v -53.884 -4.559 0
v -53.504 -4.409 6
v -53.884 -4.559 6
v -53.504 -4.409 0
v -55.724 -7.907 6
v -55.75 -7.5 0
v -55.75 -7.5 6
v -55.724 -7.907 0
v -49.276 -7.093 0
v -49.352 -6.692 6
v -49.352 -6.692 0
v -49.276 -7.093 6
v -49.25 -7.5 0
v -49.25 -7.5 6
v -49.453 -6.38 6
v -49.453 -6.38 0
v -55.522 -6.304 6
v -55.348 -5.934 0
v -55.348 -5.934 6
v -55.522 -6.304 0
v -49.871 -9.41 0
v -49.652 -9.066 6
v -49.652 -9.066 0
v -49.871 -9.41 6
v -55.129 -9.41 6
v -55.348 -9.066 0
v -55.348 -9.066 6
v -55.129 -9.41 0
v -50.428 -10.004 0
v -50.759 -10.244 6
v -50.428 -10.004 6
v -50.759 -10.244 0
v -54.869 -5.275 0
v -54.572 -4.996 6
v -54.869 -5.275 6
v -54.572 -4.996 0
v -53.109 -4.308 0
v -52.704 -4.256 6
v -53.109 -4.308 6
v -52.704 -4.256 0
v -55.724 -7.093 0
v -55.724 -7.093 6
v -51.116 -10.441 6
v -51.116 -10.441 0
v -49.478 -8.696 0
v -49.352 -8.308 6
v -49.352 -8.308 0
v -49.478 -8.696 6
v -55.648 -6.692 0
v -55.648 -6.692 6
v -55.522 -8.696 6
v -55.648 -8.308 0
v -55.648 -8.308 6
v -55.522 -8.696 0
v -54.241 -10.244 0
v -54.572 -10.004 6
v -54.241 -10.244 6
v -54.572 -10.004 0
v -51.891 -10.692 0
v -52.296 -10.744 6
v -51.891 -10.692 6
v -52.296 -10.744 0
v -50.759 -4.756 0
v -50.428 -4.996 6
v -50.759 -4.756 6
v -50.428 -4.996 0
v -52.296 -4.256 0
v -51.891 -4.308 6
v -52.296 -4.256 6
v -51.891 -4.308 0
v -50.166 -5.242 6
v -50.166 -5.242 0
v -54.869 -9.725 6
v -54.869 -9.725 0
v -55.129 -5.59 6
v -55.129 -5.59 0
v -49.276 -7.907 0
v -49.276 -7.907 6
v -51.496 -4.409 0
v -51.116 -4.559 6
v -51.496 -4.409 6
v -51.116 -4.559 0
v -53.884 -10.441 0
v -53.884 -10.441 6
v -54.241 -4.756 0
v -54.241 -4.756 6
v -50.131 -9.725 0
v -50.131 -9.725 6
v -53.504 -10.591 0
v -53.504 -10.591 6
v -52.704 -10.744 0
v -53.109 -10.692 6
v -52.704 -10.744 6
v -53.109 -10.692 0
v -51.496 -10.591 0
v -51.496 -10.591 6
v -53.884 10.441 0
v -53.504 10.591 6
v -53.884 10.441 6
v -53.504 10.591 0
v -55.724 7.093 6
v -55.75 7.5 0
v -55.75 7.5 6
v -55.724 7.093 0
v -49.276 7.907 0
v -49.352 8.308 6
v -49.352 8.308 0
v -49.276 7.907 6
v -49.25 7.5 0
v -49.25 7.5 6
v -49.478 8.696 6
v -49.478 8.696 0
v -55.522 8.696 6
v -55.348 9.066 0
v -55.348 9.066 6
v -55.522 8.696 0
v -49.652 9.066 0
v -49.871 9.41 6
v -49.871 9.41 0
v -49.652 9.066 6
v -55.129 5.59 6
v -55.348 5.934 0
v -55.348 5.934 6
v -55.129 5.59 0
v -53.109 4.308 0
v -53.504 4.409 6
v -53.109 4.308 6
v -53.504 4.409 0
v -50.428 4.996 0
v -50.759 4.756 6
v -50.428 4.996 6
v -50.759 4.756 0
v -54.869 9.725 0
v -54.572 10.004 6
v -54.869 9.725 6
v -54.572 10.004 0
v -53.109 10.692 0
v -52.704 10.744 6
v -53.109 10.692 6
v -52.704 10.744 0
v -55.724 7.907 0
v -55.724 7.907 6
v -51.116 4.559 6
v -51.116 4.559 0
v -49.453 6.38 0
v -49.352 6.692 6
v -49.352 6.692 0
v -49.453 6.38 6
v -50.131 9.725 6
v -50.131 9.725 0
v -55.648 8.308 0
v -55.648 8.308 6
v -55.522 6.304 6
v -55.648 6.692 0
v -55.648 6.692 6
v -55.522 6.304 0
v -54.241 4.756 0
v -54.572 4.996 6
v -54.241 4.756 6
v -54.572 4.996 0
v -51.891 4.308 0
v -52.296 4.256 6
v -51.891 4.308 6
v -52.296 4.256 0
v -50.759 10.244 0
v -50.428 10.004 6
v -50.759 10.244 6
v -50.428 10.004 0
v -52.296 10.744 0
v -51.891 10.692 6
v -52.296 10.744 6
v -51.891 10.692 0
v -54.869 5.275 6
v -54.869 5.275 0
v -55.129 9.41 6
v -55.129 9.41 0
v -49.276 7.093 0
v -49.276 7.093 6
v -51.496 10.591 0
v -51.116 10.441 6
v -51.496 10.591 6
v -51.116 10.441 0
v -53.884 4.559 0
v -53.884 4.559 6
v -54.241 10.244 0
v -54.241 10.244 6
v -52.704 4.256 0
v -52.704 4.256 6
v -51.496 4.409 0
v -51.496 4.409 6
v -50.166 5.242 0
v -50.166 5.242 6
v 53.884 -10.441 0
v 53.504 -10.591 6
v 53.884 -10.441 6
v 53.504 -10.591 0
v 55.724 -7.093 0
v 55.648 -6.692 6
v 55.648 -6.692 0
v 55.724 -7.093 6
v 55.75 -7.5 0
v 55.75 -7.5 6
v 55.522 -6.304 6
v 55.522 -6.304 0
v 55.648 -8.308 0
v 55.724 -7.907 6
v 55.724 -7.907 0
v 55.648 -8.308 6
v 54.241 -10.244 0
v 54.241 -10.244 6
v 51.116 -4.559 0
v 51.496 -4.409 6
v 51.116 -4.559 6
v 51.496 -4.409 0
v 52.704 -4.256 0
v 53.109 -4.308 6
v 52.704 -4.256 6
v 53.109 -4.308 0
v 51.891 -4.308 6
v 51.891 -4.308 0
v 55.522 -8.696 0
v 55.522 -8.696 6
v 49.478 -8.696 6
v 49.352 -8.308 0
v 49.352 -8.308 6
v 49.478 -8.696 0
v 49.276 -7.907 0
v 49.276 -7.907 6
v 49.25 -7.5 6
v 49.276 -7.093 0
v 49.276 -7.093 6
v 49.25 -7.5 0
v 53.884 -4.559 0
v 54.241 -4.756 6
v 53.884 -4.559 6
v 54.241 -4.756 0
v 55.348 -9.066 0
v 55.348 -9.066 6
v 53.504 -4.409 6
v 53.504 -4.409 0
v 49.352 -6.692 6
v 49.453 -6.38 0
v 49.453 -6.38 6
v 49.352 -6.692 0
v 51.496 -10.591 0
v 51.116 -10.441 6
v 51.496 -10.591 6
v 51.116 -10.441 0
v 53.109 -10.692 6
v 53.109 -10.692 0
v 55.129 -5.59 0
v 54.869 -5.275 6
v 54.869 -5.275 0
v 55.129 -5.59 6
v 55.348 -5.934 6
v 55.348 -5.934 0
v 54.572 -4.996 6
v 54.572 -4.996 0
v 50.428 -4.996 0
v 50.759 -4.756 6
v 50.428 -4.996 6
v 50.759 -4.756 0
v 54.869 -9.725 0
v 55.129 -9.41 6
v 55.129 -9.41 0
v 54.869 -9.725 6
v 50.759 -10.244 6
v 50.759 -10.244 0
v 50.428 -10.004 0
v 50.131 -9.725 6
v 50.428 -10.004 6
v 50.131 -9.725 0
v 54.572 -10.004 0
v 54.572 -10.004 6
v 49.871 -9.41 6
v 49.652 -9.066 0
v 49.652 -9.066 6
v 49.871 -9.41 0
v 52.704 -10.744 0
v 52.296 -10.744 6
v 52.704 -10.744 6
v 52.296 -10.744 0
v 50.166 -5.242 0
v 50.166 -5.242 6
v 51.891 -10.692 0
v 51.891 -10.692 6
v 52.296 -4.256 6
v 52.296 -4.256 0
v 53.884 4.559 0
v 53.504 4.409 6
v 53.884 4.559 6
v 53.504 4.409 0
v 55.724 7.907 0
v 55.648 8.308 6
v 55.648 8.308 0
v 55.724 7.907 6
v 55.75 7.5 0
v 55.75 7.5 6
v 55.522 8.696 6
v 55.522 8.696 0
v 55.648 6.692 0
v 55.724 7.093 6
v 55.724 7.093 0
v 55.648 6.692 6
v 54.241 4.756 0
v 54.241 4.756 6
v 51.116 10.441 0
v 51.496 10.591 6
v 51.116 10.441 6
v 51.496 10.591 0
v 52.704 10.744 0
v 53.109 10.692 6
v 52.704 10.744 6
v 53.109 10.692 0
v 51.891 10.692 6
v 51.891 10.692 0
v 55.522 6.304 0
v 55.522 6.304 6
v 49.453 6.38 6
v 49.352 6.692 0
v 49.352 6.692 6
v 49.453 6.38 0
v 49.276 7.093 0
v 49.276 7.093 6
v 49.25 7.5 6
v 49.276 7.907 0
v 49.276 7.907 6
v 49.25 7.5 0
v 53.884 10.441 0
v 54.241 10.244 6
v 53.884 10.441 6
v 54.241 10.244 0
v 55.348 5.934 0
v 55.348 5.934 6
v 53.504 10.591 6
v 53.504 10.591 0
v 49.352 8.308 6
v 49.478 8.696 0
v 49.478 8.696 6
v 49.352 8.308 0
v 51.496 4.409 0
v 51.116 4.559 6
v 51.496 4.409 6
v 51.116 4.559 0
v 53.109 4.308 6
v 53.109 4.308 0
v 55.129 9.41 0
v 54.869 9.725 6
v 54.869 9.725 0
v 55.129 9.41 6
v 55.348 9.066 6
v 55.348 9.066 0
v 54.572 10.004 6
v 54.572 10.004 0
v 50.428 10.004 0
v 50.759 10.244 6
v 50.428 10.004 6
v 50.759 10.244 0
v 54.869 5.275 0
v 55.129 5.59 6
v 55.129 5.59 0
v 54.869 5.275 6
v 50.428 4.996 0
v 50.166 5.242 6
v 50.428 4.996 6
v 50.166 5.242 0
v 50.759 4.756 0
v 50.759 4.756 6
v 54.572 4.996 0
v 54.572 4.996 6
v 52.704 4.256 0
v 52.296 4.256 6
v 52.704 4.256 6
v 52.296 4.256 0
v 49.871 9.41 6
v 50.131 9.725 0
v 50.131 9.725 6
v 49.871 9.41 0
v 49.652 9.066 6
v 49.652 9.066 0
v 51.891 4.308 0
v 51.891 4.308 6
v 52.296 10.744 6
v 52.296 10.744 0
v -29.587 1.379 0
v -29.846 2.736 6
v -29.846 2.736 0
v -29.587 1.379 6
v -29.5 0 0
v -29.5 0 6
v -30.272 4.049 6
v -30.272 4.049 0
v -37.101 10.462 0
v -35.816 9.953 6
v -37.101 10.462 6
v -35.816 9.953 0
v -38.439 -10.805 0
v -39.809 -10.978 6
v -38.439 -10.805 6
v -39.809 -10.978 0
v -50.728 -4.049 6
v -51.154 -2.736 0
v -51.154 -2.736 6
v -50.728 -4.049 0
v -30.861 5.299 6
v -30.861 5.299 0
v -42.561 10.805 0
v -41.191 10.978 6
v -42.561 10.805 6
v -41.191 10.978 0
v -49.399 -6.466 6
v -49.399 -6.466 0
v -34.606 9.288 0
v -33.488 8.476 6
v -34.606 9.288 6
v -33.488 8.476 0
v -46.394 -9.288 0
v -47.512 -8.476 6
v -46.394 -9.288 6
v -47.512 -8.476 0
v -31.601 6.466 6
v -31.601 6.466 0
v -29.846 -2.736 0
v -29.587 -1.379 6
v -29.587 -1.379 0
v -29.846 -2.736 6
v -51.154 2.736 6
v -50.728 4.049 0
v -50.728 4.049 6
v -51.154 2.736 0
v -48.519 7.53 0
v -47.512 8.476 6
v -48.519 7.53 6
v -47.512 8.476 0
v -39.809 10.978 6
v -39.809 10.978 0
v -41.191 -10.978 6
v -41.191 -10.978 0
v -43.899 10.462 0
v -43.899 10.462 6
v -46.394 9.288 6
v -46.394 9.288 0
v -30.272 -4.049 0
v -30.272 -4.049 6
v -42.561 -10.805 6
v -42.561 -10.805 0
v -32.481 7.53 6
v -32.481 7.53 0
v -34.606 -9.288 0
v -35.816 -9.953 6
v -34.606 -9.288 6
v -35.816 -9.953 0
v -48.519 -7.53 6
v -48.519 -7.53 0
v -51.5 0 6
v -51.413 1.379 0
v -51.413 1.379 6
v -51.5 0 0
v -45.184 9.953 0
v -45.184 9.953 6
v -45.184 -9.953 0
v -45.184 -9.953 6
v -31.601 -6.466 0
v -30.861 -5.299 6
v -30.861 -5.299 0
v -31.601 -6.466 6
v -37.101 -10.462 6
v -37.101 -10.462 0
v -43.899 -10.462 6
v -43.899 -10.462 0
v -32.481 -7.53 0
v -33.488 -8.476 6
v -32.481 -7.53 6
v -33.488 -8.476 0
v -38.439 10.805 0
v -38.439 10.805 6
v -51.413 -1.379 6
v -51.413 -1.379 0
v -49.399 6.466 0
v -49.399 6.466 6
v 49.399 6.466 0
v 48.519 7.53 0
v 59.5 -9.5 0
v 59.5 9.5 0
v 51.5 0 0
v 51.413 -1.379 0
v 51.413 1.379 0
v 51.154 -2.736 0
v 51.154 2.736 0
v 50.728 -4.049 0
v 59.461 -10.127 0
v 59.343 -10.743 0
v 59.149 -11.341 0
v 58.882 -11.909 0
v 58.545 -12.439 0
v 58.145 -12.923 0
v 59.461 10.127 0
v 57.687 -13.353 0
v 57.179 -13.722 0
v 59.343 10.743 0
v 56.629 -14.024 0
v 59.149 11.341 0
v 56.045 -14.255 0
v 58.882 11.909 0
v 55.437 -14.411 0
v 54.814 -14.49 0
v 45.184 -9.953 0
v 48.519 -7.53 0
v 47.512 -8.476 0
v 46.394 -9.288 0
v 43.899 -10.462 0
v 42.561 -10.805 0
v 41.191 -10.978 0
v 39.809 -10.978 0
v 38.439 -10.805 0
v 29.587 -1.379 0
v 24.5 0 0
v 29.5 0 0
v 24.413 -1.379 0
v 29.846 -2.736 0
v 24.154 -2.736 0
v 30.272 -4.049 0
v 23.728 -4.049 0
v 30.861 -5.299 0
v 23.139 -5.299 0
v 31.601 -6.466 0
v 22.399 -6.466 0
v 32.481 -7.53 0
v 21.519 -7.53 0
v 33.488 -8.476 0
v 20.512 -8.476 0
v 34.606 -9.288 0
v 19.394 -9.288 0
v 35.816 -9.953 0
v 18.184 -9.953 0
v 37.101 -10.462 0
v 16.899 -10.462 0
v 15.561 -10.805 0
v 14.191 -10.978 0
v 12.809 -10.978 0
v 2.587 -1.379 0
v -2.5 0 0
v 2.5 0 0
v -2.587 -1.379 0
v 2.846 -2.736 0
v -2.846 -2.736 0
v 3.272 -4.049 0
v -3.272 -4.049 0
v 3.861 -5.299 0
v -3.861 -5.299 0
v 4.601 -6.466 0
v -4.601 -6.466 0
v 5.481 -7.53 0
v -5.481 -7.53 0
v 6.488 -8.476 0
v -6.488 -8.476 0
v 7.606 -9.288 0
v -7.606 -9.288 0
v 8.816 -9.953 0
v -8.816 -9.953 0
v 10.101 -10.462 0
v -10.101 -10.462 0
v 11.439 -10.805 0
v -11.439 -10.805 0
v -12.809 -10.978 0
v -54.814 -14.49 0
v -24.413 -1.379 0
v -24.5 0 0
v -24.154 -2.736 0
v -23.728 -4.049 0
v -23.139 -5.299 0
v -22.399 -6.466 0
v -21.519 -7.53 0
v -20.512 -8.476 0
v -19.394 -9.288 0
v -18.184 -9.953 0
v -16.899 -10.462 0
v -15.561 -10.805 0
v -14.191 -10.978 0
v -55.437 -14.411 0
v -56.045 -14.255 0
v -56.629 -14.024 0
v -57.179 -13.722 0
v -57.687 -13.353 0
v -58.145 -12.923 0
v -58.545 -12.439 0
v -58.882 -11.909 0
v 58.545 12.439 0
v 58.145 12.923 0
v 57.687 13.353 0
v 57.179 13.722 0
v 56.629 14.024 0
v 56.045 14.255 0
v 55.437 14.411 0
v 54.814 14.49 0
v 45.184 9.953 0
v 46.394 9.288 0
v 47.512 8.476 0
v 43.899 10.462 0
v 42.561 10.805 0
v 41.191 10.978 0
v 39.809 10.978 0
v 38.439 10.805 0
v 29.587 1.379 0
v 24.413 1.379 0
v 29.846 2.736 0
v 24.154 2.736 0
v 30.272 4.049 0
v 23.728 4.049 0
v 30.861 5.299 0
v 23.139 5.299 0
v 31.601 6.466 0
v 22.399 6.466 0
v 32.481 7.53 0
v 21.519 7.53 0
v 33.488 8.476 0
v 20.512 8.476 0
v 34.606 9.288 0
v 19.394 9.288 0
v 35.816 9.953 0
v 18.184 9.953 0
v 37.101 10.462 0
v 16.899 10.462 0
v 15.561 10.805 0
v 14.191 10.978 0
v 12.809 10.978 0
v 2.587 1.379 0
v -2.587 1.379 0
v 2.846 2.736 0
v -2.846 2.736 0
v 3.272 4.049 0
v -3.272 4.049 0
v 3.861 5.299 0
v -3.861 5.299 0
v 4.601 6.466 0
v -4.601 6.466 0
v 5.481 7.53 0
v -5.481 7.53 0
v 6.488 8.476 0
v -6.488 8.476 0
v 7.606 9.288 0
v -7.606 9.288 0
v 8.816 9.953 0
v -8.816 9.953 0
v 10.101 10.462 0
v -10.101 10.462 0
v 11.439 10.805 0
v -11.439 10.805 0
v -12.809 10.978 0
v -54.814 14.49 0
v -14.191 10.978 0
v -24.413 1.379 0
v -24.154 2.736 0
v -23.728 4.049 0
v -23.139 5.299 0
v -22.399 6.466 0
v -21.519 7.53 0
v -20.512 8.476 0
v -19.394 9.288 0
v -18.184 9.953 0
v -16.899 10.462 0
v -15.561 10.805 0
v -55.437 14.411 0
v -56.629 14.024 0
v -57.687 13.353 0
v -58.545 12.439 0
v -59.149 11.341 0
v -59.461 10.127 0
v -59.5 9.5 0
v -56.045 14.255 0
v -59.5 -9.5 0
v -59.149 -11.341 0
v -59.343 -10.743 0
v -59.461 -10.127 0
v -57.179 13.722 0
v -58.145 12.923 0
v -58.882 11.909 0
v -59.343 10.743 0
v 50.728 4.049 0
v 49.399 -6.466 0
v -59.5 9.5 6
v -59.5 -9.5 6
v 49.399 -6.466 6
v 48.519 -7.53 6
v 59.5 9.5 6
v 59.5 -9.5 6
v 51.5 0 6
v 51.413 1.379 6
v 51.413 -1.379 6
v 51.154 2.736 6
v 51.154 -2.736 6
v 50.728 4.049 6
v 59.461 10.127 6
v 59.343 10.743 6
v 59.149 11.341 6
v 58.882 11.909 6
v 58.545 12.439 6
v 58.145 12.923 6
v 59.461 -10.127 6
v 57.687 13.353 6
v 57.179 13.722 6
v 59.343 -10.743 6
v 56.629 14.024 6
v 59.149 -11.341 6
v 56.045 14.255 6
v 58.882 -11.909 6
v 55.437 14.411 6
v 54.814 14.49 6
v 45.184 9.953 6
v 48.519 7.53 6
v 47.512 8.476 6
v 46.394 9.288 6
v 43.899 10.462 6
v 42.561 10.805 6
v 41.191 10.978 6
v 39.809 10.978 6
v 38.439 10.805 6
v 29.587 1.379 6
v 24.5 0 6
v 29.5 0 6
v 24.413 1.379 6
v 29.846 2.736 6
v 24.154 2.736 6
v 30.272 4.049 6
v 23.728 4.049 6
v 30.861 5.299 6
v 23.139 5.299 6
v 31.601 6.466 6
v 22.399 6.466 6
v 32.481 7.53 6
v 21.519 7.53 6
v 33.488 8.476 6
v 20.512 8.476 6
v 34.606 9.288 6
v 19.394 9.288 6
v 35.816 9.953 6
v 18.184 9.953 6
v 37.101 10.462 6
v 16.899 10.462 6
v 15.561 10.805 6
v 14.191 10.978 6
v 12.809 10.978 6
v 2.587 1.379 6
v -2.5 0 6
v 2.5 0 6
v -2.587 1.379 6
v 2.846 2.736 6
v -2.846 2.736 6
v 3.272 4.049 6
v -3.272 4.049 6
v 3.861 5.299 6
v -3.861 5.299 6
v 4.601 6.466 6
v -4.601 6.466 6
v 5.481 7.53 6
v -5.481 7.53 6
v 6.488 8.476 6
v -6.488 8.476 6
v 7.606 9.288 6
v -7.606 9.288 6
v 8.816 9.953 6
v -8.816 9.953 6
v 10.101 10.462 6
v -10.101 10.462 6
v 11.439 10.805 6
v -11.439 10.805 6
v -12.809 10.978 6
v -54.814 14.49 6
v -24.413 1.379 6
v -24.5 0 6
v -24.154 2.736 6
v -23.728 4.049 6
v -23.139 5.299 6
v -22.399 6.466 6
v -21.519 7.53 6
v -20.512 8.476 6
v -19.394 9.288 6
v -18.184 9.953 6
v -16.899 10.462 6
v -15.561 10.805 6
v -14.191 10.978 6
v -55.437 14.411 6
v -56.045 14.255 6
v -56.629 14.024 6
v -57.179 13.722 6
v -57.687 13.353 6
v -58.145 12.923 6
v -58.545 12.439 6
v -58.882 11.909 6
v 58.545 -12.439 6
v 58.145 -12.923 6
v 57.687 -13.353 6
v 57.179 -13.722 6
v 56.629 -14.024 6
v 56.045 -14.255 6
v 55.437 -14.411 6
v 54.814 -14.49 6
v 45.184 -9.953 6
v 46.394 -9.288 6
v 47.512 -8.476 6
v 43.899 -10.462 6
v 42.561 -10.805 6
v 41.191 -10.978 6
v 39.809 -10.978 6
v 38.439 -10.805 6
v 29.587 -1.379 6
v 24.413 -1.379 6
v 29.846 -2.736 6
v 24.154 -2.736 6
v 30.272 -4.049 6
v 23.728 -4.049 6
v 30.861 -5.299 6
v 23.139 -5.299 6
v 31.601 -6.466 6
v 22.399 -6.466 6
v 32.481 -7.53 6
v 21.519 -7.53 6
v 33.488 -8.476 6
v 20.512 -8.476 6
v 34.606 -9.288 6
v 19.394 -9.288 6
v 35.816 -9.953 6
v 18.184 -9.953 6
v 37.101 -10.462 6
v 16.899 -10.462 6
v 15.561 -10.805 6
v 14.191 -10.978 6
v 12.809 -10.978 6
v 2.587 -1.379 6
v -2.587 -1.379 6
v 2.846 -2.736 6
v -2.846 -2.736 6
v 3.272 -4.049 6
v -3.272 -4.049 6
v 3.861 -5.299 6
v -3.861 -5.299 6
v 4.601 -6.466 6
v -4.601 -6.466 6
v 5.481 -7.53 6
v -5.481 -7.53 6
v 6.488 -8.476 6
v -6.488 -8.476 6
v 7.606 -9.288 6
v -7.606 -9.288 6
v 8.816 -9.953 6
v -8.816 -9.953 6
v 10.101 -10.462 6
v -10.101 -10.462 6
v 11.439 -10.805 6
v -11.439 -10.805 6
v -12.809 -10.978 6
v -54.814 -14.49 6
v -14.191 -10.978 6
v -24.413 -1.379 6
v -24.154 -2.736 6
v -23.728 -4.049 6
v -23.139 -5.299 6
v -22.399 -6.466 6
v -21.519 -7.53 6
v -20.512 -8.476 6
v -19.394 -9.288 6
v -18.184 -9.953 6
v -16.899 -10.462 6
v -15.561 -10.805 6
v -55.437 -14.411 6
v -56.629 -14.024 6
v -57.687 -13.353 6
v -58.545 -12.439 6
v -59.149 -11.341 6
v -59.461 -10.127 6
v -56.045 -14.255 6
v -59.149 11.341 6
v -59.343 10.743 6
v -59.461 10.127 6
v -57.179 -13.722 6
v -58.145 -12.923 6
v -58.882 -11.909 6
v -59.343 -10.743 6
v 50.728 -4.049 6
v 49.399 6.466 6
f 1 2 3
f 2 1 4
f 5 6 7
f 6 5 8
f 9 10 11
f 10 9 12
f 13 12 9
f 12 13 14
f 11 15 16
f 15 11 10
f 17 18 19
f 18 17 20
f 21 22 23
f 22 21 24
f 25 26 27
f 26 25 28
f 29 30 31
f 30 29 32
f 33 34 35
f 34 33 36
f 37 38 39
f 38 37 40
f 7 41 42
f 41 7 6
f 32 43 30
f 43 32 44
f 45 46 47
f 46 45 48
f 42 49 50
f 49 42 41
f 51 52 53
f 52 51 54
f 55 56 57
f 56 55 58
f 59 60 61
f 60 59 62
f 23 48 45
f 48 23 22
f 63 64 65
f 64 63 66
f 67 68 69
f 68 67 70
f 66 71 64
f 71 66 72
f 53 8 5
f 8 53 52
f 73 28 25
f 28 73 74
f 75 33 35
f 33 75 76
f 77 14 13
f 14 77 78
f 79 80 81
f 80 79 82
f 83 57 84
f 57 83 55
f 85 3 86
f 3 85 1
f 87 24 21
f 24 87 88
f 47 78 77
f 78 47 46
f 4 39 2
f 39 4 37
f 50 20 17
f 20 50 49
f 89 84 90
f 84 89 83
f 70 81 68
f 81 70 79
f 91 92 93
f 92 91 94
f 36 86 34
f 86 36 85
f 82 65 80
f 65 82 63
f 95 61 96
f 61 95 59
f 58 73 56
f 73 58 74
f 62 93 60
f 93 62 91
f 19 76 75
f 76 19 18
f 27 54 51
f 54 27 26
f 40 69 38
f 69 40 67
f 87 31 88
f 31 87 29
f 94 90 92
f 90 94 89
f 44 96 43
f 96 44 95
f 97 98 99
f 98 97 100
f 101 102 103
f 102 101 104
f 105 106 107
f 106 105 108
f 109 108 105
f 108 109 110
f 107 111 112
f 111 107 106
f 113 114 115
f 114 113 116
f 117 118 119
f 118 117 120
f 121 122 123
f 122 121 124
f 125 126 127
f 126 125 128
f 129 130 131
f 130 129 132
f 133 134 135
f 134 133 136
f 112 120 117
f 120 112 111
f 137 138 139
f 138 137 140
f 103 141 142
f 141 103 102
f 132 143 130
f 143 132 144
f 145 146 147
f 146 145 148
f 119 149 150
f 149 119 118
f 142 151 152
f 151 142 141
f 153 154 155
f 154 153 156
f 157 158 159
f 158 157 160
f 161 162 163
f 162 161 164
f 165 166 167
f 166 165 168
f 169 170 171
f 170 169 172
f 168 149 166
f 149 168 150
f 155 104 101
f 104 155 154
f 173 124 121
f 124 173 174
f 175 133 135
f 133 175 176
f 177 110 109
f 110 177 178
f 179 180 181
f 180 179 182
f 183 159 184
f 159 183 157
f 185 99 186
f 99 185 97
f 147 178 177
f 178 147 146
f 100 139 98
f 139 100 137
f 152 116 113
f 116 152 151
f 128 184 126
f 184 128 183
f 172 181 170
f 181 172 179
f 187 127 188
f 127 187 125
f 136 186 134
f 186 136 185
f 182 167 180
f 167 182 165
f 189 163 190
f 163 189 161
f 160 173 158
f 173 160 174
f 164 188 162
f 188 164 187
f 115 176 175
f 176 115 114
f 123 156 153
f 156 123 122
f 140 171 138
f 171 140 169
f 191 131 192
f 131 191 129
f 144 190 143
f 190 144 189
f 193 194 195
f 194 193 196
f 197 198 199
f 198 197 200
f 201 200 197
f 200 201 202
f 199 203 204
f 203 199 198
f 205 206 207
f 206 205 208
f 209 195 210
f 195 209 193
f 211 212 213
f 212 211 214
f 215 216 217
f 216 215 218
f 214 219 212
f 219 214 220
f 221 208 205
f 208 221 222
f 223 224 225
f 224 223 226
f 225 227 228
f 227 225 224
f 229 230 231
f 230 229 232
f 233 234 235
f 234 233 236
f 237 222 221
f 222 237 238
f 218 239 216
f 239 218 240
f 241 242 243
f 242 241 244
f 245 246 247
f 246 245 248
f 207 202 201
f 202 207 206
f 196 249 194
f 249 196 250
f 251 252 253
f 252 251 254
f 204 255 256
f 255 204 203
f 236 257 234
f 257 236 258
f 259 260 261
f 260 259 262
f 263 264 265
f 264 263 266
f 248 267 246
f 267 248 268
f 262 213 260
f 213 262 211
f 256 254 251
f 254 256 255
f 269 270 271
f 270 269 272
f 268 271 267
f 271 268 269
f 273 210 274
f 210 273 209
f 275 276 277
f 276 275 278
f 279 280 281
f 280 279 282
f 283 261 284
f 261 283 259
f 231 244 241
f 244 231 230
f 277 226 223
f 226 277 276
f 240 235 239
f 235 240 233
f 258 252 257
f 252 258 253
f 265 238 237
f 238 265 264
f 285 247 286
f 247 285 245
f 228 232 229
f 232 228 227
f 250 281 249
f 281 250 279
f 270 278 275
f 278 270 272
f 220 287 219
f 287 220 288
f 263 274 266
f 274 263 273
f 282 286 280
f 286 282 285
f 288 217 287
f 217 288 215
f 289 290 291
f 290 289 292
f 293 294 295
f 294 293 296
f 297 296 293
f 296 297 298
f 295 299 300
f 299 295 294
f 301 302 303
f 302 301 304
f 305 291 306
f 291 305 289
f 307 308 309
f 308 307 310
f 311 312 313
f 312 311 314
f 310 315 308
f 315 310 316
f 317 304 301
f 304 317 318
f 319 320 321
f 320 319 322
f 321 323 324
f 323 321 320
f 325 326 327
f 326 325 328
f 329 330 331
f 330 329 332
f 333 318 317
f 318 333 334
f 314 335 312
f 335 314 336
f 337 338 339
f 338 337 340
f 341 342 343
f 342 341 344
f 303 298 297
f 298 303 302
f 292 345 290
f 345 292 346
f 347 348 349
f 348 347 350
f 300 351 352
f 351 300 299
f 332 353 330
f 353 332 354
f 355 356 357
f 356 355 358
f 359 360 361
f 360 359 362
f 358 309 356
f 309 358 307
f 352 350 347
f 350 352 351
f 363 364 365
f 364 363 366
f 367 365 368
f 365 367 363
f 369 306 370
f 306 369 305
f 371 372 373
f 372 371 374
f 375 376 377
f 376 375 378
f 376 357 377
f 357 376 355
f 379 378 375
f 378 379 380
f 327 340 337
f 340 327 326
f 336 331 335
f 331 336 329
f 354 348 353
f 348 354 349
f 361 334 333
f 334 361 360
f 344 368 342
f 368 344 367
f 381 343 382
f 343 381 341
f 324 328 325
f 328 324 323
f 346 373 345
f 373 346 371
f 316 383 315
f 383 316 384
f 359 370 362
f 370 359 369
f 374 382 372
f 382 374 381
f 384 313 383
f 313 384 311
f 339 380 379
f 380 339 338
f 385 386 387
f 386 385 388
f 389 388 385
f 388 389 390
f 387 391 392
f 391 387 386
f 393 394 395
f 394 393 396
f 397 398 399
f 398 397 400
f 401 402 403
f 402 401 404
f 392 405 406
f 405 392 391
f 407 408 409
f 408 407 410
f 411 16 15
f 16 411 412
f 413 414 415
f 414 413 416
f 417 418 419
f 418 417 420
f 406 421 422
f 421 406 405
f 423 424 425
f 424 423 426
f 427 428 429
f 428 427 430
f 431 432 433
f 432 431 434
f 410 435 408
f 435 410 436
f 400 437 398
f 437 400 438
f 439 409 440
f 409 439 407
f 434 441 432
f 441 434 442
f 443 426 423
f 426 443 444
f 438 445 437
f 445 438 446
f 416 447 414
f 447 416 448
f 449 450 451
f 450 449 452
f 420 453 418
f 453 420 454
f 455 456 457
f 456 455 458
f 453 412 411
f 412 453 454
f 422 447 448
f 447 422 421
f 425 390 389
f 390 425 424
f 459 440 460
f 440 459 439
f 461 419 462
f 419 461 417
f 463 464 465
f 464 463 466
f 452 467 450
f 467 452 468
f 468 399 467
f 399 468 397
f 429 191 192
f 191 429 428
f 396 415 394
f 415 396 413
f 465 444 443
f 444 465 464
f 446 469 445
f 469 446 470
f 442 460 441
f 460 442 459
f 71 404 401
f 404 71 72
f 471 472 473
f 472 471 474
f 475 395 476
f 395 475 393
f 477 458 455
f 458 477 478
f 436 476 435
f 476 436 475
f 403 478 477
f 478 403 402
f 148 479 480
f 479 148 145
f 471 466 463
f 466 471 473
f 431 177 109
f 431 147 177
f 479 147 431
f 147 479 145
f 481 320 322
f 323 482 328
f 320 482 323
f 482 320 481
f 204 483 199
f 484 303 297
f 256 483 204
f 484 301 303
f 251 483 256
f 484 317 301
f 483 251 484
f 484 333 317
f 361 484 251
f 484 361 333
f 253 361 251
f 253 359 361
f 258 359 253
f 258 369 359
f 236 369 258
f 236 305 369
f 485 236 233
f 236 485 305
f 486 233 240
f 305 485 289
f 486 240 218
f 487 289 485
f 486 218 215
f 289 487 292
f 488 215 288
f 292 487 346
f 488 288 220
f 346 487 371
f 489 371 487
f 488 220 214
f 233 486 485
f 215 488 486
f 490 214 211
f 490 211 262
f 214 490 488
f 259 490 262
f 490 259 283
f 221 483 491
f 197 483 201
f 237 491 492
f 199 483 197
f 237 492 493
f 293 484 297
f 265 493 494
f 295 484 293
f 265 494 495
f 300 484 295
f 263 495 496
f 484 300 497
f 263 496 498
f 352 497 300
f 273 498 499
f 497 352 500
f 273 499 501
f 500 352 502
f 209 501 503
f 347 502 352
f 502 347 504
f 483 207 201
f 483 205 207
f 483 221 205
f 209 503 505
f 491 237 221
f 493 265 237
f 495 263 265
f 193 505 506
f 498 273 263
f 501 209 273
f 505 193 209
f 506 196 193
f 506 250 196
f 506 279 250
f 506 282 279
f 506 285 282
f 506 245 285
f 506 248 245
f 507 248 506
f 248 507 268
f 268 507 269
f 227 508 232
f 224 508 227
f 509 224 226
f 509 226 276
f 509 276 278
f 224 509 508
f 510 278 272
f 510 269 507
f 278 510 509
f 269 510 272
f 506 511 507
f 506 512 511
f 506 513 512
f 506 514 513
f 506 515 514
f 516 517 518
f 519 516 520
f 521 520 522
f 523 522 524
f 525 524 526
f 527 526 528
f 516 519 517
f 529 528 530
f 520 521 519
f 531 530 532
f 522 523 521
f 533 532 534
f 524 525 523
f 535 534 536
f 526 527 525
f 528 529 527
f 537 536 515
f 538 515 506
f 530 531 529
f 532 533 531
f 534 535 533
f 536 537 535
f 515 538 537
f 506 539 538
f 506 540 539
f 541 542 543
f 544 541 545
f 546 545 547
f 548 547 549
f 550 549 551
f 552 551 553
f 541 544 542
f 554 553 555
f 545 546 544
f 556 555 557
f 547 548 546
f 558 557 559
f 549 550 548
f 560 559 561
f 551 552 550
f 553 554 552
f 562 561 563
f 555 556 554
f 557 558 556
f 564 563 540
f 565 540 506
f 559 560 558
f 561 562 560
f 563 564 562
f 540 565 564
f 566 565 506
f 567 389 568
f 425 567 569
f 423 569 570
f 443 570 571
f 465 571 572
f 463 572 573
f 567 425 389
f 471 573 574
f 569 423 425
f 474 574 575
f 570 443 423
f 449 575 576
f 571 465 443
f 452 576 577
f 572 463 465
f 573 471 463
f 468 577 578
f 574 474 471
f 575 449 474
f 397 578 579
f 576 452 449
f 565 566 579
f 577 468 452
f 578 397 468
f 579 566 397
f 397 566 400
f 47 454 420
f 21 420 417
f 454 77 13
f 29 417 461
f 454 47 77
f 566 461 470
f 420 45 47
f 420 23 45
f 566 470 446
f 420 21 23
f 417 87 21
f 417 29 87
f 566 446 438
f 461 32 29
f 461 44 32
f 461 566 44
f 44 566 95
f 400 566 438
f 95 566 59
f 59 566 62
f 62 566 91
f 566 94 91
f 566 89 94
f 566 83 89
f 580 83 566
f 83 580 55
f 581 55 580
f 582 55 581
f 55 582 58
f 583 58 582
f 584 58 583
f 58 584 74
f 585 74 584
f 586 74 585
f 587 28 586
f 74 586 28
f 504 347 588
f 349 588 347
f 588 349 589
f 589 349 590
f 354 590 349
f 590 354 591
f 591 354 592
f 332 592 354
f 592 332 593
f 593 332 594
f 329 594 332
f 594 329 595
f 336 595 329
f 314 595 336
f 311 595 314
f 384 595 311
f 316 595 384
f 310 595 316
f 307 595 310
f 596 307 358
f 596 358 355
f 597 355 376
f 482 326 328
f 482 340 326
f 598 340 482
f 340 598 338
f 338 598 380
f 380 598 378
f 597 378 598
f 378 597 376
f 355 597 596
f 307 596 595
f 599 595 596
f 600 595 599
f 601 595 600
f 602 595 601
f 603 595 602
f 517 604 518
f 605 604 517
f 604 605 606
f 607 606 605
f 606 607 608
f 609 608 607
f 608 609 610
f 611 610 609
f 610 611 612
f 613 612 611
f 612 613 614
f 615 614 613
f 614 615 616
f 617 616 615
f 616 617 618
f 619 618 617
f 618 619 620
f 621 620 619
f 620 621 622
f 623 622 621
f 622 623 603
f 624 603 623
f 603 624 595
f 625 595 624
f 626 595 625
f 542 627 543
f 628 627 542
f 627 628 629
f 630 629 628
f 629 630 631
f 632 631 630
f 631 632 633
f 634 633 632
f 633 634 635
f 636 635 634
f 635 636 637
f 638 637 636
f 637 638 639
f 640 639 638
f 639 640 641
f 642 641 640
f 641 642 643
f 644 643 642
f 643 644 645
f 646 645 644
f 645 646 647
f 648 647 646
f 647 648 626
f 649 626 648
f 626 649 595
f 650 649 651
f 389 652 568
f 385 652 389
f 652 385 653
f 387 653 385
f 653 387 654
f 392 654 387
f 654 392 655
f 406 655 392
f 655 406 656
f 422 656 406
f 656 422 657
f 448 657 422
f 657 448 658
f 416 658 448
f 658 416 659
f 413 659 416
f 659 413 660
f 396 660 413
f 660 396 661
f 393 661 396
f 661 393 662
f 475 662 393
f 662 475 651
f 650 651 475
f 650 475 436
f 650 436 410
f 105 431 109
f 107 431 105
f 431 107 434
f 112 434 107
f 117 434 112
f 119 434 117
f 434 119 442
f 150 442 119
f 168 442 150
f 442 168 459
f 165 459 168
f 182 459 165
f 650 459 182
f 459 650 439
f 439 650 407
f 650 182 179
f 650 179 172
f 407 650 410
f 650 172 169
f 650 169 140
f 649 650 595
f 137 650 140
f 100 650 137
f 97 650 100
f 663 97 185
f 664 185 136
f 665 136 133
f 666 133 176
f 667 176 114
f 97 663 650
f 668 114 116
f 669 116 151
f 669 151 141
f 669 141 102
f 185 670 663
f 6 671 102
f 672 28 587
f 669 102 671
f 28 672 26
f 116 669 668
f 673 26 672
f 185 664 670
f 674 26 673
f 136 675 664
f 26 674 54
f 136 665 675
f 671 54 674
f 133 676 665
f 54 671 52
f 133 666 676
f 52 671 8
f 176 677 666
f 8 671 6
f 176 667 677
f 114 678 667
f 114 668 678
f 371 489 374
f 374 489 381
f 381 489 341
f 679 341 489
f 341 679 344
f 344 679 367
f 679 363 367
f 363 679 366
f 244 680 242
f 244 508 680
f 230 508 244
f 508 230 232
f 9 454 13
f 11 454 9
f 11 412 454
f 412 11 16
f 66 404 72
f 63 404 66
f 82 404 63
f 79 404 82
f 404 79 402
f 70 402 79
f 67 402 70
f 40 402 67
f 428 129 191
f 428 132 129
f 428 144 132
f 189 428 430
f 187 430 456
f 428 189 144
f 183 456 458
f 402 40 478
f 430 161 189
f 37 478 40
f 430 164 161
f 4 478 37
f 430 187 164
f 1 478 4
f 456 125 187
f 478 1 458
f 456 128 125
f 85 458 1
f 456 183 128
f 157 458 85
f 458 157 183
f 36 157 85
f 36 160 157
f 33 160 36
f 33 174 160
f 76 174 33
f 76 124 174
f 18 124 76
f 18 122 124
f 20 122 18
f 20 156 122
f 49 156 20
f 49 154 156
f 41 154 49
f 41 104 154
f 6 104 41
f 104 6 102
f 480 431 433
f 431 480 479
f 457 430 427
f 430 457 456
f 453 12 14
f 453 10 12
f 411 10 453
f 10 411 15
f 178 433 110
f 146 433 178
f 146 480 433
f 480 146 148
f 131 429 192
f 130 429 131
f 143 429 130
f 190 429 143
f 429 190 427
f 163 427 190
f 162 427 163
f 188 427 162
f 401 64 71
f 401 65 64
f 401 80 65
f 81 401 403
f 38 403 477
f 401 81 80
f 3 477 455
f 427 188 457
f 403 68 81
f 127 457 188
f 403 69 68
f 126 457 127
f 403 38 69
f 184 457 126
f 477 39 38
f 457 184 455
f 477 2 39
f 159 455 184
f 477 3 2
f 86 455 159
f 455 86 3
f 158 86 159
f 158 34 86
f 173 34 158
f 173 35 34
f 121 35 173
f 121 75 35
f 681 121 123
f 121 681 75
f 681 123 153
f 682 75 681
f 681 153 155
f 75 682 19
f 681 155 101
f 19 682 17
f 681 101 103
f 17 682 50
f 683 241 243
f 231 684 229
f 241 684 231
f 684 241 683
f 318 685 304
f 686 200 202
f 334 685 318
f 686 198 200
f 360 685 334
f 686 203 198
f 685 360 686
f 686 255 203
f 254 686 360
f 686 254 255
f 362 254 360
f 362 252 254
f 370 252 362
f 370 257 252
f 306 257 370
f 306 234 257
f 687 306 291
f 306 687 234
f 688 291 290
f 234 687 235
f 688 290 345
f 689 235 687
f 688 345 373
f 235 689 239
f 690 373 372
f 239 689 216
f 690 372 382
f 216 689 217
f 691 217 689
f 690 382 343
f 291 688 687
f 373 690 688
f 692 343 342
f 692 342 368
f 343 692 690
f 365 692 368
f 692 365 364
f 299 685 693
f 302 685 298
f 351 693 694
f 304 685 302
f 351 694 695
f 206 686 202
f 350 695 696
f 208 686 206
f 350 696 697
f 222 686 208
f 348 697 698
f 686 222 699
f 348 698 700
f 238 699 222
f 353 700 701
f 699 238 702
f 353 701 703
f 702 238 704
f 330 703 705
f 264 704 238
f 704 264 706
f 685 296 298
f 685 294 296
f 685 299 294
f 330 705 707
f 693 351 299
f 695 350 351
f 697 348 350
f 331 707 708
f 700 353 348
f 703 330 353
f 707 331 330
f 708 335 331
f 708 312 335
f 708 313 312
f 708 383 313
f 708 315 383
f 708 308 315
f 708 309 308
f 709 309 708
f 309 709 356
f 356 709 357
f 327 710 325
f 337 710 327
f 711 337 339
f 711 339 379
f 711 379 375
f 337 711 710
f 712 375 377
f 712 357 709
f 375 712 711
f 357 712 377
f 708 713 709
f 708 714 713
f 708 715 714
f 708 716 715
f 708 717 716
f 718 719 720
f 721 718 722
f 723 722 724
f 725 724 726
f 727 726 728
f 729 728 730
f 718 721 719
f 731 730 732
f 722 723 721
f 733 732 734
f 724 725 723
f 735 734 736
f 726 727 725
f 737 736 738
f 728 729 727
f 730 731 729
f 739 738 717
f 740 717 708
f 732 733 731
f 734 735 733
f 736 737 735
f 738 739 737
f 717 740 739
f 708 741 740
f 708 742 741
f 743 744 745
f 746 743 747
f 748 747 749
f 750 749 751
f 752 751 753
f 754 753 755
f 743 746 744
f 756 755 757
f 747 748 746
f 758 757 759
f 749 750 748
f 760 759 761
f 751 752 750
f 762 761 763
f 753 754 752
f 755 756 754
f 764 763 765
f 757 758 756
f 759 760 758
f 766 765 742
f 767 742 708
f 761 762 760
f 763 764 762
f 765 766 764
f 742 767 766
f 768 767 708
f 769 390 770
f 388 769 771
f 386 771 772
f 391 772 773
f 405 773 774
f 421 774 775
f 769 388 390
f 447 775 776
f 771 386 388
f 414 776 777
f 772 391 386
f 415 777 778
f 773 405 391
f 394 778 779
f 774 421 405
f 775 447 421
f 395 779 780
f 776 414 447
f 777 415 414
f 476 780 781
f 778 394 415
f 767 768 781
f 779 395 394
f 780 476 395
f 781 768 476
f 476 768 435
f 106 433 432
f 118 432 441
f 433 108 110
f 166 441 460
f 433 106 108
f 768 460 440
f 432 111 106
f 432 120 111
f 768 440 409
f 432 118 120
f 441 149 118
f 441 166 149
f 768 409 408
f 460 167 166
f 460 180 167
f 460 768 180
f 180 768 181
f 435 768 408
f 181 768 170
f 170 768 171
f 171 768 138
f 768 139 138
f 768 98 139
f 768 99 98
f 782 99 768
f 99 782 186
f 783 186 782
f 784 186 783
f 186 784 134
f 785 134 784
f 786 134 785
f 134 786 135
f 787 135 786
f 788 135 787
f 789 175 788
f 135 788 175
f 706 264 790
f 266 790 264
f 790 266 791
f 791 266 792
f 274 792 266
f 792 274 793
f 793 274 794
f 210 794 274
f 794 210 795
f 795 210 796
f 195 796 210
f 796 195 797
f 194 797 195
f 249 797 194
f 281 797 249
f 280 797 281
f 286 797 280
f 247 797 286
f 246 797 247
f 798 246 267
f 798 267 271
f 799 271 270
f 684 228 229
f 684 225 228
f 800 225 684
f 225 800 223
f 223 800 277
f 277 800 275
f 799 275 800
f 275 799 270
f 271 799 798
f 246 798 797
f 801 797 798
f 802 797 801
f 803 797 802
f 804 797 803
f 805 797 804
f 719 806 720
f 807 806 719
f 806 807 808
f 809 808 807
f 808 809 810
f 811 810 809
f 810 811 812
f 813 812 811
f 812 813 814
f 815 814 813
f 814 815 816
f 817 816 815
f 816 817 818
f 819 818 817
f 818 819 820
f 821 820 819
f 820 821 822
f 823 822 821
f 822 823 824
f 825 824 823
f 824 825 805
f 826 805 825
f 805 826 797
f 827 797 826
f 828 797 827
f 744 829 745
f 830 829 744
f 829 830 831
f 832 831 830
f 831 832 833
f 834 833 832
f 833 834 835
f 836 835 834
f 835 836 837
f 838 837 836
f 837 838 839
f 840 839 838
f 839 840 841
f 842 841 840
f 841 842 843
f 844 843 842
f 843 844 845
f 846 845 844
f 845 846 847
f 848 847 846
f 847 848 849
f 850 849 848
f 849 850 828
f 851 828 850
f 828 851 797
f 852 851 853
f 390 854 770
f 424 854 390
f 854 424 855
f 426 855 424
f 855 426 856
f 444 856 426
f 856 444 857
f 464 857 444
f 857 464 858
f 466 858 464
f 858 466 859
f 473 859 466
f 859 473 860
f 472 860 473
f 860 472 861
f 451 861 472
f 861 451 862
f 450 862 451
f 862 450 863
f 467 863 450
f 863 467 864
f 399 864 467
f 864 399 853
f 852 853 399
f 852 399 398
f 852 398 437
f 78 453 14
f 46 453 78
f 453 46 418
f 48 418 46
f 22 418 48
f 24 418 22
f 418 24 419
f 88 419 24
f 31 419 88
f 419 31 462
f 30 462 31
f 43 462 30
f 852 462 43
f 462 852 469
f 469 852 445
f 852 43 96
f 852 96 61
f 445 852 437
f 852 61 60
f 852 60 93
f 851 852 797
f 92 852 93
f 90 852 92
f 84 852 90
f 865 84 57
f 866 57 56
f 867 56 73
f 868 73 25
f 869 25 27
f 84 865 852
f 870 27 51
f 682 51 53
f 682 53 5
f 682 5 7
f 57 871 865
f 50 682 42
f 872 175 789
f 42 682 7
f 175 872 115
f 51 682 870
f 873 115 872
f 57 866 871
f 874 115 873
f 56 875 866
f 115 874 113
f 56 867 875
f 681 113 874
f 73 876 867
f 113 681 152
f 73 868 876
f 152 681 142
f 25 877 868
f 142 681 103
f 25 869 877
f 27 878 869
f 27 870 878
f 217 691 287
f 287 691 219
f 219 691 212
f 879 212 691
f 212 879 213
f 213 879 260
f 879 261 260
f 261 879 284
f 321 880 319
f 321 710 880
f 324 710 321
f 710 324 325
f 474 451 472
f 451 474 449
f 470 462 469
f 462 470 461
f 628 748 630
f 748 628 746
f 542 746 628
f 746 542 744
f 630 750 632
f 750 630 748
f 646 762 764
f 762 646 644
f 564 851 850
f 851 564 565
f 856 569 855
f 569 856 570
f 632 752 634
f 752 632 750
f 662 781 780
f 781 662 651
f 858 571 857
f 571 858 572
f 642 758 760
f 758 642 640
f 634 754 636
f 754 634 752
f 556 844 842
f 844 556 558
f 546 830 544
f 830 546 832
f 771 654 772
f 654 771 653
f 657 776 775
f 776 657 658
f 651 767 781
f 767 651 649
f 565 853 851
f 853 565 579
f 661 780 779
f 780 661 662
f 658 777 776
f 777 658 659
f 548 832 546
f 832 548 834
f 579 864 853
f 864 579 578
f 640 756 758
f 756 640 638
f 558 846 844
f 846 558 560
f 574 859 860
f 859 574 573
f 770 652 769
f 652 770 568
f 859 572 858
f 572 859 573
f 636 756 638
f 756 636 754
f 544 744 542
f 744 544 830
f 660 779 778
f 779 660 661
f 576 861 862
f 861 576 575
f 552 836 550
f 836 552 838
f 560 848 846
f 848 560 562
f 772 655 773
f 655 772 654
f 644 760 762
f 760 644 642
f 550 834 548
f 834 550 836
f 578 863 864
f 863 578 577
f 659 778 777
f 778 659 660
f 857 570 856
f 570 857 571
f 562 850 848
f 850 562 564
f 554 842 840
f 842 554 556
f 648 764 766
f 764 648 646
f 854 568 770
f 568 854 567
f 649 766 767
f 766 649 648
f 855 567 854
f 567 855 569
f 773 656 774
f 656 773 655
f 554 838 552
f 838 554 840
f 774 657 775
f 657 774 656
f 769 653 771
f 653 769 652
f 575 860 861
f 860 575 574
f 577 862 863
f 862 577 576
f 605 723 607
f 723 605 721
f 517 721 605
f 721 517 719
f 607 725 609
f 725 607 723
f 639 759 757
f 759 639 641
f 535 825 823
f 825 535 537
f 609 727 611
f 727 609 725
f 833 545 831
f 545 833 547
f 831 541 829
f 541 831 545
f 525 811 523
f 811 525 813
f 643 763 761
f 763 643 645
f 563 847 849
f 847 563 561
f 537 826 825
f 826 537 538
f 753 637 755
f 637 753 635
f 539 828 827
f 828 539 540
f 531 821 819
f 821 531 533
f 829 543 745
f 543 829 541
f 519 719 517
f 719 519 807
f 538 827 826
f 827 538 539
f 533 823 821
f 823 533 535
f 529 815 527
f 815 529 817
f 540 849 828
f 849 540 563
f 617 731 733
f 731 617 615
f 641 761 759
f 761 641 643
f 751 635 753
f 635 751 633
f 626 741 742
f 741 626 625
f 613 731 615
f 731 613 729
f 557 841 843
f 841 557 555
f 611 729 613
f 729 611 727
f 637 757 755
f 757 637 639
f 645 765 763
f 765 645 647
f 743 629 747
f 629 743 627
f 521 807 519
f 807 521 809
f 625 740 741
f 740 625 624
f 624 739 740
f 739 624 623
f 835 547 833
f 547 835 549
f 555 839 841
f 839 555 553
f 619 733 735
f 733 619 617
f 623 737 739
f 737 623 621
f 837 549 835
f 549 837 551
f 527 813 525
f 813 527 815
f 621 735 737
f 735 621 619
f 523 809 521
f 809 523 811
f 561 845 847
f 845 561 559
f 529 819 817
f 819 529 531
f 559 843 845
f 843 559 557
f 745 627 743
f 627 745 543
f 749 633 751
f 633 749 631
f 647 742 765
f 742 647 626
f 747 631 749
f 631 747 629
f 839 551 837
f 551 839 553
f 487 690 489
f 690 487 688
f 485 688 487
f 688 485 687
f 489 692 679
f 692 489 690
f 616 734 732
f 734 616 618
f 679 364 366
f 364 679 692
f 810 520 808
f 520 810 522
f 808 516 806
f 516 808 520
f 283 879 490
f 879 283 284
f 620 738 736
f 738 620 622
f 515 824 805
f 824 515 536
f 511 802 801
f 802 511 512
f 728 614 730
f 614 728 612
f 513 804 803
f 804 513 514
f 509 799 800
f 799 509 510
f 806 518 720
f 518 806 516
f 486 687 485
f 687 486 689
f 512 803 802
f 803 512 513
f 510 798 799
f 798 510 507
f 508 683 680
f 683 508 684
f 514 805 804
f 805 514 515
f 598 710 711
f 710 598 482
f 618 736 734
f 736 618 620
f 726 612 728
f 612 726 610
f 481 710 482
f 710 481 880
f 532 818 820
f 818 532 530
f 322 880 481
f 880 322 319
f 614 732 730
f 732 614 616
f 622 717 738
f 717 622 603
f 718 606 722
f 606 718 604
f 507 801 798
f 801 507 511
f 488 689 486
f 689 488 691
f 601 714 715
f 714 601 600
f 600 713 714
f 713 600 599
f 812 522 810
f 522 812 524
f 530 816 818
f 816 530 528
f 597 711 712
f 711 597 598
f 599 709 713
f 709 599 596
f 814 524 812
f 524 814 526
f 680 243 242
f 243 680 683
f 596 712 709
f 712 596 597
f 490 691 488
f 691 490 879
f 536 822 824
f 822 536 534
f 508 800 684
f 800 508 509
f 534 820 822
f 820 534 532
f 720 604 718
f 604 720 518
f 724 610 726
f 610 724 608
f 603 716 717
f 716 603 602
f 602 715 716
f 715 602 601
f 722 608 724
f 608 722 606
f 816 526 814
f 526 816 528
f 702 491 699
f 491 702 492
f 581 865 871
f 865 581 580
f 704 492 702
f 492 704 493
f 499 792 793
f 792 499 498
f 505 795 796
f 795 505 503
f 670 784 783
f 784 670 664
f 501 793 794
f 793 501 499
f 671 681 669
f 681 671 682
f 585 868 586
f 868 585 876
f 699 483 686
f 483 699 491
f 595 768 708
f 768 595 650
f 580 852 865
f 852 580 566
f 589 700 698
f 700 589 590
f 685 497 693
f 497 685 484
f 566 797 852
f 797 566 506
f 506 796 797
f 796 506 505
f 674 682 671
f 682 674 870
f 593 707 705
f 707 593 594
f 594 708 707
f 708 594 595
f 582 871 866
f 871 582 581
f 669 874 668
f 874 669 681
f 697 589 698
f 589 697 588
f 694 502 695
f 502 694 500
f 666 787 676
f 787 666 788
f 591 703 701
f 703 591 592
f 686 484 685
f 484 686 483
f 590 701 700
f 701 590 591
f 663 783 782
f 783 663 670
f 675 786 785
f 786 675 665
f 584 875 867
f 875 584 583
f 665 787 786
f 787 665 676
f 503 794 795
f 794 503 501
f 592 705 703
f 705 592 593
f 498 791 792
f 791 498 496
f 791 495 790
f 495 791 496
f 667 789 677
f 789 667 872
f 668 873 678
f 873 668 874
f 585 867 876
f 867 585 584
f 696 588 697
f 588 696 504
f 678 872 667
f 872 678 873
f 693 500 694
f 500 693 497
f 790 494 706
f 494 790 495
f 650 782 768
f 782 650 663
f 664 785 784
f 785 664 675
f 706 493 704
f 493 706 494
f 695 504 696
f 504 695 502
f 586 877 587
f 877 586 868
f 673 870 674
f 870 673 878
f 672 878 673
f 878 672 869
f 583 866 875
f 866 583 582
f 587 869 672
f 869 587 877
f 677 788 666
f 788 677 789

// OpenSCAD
$fn = 50;

difference() {
	union() {
		hull() {
			translate(v = [-54.5, 9.5, 0]) {
				cylinder(h = 6, r = 5);
			}
			translate(v = [54.5, 9.5, 0]) {
				cylinder(h = 6, r = 5);
			}
			translate(v = [-54.5, -9.5, 0]) {
				cylinder(h = 6, r = 5);
			}
			translate(v = [54.5, -9.5, 0]) {
				cylinder(h = 6, r = 5);
			}
		}
	}
	union() {
		translate(v = [-52.5, -7.5, -100.0]) {
			cylinder(h = 200, r = 3.25);
		}
		translate(v = [-52.5, 7.5, -100.0]) {
			cylinder(h = 200, r = 3.25);
		}
		translate(v = [52.5, -7.5, -100.0]) {
			cylinder(h = 200, r = 3.25);
		}
		translate(v = [52.5, 7.5, -100.0]) {
			cylinder(h = 200, r = 3.25);
		}
		translate(v = [-52.5, -7.5, -100.0]) {
			cylinder(h = 200, r = 1.8);
		}
		translate(v = [-52.5, 7.5, -100.0]) {
			cylinder(h = 200, r = 1.8);
		}
		translate(v = [52.5, -7.5, -100.0]) {
			cylinder(h = 200, r = 1.8);
		}
		translate(v = [52.5, 7.5, -100.0]) {
			cylinder(h = 200, r = 1.8);
		}
		translate(v = [-40.5, 0, 0.0]) {
			cylinder(h = 6, r = 11.0);
		}
		translate(v = [-13.5, 0, 0.0]) {
			cylinder(h = 6, r = 11.0);
		}
		translate(v = [13.5, 0, 0.0]) {
			cylinder(h = 6, r = 11.0);
		}
		translate(v = [40.5, 0, 0.0]) {
			cylinder(h = 6, r = 11.0);
		}
	}
}
